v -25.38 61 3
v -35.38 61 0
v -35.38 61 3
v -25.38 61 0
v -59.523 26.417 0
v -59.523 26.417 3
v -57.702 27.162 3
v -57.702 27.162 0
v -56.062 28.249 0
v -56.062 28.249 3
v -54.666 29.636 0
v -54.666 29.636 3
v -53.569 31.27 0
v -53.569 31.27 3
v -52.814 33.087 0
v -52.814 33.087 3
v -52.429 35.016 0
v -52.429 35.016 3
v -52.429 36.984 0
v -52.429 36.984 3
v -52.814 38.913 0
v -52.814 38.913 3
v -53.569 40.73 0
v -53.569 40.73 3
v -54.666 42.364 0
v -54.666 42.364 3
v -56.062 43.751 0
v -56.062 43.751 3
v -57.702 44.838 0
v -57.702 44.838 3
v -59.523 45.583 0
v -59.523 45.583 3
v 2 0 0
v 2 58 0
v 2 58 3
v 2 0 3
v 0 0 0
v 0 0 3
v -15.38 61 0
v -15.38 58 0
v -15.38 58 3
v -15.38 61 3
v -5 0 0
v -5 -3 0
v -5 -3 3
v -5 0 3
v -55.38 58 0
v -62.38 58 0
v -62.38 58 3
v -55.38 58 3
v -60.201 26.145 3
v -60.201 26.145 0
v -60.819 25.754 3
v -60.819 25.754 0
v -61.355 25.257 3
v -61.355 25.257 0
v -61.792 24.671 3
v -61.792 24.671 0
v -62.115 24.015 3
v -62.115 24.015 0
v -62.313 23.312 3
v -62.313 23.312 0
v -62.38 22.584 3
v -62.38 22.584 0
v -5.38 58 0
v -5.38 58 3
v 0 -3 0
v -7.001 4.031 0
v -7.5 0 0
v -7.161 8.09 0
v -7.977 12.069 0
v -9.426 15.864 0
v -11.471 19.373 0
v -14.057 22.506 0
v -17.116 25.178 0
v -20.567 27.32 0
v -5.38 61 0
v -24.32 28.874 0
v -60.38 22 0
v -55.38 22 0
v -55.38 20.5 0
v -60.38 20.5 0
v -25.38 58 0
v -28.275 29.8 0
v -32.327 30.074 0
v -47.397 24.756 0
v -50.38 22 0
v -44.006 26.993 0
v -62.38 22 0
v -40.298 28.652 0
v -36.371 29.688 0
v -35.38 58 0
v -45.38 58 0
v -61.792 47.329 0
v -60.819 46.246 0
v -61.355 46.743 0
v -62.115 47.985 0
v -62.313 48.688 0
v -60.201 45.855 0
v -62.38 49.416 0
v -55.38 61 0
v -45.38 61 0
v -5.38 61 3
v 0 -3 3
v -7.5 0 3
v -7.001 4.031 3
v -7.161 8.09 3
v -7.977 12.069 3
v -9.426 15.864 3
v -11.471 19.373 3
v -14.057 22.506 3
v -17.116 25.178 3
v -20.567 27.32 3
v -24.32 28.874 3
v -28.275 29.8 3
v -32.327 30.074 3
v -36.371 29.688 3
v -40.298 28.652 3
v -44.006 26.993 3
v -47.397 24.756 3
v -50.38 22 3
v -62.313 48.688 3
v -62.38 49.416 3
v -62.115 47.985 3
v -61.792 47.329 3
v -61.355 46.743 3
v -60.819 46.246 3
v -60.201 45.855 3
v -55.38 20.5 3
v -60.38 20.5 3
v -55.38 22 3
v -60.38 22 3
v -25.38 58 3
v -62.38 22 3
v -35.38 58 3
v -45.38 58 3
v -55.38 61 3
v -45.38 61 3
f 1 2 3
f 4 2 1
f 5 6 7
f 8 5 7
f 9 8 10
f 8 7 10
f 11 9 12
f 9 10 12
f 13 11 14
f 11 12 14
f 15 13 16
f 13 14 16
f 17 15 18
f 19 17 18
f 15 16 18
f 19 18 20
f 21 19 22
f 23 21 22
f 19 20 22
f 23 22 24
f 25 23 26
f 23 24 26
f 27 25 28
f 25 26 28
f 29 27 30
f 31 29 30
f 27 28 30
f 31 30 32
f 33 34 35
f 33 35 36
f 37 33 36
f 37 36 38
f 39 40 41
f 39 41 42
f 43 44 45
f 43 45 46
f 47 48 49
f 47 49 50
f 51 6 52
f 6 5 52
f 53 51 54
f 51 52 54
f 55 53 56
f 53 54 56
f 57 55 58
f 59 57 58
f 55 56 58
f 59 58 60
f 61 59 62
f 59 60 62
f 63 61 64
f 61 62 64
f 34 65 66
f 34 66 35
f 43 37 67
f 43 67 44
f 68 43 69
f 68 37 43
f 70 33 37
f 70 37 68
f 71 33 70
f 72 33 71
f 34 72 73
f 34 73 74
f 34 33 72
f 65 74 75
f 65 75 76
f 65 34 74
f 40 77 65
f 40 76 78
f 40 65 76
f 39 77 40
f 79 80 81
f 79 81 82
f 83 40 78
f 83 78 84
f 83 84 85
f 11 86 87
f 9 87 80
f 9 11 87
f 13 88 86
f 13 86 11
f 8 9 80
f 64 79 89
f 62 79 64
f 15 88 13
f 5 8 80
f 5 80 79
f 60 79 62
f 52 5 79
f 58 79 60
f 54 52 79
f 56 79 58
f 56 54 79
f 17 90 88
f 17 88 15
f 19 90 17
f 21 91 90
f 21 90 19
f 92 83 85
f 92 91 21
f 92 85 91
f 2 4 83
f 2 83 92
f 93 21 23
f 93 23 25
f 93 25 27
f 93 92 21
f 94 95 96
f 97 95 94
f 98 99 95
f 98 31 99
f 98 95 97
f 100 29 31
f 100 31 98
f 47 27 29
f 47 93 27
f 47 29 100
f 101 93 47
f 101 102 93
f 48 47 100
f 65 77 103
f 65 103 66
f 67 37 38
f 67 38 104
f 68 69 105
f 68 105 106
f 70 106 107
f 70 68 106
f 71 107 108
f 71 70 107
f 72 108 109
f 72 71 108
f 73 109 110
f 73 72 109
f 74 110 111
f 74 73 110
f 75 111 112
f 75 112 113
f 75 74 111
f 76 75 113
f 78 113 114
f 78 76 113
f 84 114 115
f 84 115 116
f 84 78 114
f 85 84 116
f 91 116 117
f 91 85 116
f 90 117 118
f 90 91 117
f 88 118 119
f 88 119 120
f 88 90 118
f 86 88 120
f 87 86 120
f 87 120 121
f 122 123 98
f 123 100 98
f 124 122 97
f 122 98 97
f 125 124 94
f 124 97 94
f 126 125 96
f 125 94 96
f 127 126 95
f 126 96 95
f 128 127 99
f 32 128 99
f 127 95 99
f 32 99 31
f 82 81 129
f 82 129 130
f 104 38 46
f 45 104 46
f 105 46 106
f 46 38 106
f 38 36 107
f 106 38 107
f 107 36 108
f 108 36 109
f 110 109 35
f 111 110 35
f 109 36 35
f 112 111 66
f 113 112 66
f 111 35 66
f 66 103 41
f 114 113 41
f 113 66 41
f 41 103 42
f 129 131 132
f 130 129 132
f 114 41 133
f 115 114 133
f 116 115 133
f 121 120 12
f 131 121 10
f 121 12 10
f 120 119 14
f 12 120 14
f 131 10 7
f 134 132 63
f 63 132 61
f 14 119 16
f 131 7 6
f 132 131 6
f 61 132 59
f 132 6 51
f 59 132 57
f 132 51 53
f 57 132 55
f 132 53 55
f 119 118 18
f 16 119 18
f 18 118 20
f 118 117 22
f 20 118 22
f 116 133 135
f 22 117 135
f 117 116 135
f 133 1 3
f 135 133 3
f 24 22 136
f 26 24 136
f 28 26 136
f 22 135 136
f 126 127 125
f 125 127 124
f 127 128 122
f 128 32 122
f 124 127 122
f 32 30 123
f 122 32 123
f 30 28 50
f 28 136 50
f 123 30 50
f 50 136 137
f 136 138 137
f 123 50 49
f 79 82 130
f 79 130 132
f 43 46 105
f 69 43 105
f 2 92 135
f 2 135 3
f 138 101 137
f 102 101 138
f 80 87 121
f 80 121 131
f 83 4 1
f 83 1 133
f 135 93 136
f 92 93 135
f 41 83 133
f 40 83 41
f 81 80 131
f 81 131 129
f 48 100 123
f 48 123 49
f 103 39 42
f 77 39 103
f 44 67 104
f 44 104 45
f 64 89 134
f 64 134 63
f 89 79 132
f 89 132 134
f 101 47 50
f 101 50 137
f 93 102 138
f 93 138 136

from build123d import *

# Parameters (mm, degrees)
SALIENTE_EXTRUIR1_DEPTH = 3
CORTAR_EXTRUIR1_DEPTH   = 3
REDONDEO1_R             = 4


with BuildPart() as part:
    # Croquis1 → Saliente-Extruir1 (new body)
    with BuildSketch(Plane.XY):
        with BuildLine():
            Line((0, 0), (0, -3))
            Line((0, -3), (-5, -3))
            Line((-5, -3), (-5, 0))
            Line((-5, 0), (-7.5, 0))
            ThreePointArc((-7.5, 0), (-20.567061666, 27.319617989), (-50.38, 22))
            Line((-50.38, 22), (-55.38, 22))
            Line((-55.38, 22), (-55.38, 20.5))
            Line((-55.38, 20.5), (-60.38, 20.5))
            Line((-60.38, 20.5), (-60.38, 22))
            Line((-60.38, 22), (-62.38, 22))
            Line((-62.38, 22), (-62.38, 58))
            Line((-62.38, 58), (-55.38, 58))
            Line((-55.38, 58), (-55.38, 61))
            Line((-55.38, 61), (-45.38, 61))
            Line((-45.38, 61), (-45.38, 58))
            Line((-45.38, 58), (-35.38, 58))
            Line((-35.38, 58), (-35.38, 61))
            Line((-35.38, 61), (-25.38, 61))
            Line((-25.38, 61), (-25.38, 58))
            Line((-25.38, 58), (-15.38, 58))
            Line((-15.38, 58), (-15.38, 61))
            Line((-15.38, 61), (-5.38, 61))
            Line((-5.38, 61), (-5.38, 58))
            Line((-5.38, 58), (2, 58))
            Line((2, 58), (2, 0))
            Line((2, 0), (0, 0))
        make_face()
    extrude(amount=SALIENTE_EXTRUIR1_DEPTH)

    # Croquis2 → Cortar-Extruir1 (cut)
    with BuildSketch(Plane.XY.offset(3)):
        with BuildLine():
            Line((-62.38, 46), (-62.38, 26))
            ThreePointArc((-62.38, 26), (-52.38, 36), (-62.38, 46))
        make_face()
    extrude(amount=-CORTAR_EXTRUIR1_DEPTH, mode=Mode.SUBTRACT)

    # Redondeo1
    redondeo1_edges = [part.edges().sort_by_distance(p)[0] for p in [
        (-62.38, 46, 1.5),
        (-62.38, 26, 1.5),
    ]]
    fillet(redondeo1_edges, radius=REDONDEO1_R)


solid = part.part
